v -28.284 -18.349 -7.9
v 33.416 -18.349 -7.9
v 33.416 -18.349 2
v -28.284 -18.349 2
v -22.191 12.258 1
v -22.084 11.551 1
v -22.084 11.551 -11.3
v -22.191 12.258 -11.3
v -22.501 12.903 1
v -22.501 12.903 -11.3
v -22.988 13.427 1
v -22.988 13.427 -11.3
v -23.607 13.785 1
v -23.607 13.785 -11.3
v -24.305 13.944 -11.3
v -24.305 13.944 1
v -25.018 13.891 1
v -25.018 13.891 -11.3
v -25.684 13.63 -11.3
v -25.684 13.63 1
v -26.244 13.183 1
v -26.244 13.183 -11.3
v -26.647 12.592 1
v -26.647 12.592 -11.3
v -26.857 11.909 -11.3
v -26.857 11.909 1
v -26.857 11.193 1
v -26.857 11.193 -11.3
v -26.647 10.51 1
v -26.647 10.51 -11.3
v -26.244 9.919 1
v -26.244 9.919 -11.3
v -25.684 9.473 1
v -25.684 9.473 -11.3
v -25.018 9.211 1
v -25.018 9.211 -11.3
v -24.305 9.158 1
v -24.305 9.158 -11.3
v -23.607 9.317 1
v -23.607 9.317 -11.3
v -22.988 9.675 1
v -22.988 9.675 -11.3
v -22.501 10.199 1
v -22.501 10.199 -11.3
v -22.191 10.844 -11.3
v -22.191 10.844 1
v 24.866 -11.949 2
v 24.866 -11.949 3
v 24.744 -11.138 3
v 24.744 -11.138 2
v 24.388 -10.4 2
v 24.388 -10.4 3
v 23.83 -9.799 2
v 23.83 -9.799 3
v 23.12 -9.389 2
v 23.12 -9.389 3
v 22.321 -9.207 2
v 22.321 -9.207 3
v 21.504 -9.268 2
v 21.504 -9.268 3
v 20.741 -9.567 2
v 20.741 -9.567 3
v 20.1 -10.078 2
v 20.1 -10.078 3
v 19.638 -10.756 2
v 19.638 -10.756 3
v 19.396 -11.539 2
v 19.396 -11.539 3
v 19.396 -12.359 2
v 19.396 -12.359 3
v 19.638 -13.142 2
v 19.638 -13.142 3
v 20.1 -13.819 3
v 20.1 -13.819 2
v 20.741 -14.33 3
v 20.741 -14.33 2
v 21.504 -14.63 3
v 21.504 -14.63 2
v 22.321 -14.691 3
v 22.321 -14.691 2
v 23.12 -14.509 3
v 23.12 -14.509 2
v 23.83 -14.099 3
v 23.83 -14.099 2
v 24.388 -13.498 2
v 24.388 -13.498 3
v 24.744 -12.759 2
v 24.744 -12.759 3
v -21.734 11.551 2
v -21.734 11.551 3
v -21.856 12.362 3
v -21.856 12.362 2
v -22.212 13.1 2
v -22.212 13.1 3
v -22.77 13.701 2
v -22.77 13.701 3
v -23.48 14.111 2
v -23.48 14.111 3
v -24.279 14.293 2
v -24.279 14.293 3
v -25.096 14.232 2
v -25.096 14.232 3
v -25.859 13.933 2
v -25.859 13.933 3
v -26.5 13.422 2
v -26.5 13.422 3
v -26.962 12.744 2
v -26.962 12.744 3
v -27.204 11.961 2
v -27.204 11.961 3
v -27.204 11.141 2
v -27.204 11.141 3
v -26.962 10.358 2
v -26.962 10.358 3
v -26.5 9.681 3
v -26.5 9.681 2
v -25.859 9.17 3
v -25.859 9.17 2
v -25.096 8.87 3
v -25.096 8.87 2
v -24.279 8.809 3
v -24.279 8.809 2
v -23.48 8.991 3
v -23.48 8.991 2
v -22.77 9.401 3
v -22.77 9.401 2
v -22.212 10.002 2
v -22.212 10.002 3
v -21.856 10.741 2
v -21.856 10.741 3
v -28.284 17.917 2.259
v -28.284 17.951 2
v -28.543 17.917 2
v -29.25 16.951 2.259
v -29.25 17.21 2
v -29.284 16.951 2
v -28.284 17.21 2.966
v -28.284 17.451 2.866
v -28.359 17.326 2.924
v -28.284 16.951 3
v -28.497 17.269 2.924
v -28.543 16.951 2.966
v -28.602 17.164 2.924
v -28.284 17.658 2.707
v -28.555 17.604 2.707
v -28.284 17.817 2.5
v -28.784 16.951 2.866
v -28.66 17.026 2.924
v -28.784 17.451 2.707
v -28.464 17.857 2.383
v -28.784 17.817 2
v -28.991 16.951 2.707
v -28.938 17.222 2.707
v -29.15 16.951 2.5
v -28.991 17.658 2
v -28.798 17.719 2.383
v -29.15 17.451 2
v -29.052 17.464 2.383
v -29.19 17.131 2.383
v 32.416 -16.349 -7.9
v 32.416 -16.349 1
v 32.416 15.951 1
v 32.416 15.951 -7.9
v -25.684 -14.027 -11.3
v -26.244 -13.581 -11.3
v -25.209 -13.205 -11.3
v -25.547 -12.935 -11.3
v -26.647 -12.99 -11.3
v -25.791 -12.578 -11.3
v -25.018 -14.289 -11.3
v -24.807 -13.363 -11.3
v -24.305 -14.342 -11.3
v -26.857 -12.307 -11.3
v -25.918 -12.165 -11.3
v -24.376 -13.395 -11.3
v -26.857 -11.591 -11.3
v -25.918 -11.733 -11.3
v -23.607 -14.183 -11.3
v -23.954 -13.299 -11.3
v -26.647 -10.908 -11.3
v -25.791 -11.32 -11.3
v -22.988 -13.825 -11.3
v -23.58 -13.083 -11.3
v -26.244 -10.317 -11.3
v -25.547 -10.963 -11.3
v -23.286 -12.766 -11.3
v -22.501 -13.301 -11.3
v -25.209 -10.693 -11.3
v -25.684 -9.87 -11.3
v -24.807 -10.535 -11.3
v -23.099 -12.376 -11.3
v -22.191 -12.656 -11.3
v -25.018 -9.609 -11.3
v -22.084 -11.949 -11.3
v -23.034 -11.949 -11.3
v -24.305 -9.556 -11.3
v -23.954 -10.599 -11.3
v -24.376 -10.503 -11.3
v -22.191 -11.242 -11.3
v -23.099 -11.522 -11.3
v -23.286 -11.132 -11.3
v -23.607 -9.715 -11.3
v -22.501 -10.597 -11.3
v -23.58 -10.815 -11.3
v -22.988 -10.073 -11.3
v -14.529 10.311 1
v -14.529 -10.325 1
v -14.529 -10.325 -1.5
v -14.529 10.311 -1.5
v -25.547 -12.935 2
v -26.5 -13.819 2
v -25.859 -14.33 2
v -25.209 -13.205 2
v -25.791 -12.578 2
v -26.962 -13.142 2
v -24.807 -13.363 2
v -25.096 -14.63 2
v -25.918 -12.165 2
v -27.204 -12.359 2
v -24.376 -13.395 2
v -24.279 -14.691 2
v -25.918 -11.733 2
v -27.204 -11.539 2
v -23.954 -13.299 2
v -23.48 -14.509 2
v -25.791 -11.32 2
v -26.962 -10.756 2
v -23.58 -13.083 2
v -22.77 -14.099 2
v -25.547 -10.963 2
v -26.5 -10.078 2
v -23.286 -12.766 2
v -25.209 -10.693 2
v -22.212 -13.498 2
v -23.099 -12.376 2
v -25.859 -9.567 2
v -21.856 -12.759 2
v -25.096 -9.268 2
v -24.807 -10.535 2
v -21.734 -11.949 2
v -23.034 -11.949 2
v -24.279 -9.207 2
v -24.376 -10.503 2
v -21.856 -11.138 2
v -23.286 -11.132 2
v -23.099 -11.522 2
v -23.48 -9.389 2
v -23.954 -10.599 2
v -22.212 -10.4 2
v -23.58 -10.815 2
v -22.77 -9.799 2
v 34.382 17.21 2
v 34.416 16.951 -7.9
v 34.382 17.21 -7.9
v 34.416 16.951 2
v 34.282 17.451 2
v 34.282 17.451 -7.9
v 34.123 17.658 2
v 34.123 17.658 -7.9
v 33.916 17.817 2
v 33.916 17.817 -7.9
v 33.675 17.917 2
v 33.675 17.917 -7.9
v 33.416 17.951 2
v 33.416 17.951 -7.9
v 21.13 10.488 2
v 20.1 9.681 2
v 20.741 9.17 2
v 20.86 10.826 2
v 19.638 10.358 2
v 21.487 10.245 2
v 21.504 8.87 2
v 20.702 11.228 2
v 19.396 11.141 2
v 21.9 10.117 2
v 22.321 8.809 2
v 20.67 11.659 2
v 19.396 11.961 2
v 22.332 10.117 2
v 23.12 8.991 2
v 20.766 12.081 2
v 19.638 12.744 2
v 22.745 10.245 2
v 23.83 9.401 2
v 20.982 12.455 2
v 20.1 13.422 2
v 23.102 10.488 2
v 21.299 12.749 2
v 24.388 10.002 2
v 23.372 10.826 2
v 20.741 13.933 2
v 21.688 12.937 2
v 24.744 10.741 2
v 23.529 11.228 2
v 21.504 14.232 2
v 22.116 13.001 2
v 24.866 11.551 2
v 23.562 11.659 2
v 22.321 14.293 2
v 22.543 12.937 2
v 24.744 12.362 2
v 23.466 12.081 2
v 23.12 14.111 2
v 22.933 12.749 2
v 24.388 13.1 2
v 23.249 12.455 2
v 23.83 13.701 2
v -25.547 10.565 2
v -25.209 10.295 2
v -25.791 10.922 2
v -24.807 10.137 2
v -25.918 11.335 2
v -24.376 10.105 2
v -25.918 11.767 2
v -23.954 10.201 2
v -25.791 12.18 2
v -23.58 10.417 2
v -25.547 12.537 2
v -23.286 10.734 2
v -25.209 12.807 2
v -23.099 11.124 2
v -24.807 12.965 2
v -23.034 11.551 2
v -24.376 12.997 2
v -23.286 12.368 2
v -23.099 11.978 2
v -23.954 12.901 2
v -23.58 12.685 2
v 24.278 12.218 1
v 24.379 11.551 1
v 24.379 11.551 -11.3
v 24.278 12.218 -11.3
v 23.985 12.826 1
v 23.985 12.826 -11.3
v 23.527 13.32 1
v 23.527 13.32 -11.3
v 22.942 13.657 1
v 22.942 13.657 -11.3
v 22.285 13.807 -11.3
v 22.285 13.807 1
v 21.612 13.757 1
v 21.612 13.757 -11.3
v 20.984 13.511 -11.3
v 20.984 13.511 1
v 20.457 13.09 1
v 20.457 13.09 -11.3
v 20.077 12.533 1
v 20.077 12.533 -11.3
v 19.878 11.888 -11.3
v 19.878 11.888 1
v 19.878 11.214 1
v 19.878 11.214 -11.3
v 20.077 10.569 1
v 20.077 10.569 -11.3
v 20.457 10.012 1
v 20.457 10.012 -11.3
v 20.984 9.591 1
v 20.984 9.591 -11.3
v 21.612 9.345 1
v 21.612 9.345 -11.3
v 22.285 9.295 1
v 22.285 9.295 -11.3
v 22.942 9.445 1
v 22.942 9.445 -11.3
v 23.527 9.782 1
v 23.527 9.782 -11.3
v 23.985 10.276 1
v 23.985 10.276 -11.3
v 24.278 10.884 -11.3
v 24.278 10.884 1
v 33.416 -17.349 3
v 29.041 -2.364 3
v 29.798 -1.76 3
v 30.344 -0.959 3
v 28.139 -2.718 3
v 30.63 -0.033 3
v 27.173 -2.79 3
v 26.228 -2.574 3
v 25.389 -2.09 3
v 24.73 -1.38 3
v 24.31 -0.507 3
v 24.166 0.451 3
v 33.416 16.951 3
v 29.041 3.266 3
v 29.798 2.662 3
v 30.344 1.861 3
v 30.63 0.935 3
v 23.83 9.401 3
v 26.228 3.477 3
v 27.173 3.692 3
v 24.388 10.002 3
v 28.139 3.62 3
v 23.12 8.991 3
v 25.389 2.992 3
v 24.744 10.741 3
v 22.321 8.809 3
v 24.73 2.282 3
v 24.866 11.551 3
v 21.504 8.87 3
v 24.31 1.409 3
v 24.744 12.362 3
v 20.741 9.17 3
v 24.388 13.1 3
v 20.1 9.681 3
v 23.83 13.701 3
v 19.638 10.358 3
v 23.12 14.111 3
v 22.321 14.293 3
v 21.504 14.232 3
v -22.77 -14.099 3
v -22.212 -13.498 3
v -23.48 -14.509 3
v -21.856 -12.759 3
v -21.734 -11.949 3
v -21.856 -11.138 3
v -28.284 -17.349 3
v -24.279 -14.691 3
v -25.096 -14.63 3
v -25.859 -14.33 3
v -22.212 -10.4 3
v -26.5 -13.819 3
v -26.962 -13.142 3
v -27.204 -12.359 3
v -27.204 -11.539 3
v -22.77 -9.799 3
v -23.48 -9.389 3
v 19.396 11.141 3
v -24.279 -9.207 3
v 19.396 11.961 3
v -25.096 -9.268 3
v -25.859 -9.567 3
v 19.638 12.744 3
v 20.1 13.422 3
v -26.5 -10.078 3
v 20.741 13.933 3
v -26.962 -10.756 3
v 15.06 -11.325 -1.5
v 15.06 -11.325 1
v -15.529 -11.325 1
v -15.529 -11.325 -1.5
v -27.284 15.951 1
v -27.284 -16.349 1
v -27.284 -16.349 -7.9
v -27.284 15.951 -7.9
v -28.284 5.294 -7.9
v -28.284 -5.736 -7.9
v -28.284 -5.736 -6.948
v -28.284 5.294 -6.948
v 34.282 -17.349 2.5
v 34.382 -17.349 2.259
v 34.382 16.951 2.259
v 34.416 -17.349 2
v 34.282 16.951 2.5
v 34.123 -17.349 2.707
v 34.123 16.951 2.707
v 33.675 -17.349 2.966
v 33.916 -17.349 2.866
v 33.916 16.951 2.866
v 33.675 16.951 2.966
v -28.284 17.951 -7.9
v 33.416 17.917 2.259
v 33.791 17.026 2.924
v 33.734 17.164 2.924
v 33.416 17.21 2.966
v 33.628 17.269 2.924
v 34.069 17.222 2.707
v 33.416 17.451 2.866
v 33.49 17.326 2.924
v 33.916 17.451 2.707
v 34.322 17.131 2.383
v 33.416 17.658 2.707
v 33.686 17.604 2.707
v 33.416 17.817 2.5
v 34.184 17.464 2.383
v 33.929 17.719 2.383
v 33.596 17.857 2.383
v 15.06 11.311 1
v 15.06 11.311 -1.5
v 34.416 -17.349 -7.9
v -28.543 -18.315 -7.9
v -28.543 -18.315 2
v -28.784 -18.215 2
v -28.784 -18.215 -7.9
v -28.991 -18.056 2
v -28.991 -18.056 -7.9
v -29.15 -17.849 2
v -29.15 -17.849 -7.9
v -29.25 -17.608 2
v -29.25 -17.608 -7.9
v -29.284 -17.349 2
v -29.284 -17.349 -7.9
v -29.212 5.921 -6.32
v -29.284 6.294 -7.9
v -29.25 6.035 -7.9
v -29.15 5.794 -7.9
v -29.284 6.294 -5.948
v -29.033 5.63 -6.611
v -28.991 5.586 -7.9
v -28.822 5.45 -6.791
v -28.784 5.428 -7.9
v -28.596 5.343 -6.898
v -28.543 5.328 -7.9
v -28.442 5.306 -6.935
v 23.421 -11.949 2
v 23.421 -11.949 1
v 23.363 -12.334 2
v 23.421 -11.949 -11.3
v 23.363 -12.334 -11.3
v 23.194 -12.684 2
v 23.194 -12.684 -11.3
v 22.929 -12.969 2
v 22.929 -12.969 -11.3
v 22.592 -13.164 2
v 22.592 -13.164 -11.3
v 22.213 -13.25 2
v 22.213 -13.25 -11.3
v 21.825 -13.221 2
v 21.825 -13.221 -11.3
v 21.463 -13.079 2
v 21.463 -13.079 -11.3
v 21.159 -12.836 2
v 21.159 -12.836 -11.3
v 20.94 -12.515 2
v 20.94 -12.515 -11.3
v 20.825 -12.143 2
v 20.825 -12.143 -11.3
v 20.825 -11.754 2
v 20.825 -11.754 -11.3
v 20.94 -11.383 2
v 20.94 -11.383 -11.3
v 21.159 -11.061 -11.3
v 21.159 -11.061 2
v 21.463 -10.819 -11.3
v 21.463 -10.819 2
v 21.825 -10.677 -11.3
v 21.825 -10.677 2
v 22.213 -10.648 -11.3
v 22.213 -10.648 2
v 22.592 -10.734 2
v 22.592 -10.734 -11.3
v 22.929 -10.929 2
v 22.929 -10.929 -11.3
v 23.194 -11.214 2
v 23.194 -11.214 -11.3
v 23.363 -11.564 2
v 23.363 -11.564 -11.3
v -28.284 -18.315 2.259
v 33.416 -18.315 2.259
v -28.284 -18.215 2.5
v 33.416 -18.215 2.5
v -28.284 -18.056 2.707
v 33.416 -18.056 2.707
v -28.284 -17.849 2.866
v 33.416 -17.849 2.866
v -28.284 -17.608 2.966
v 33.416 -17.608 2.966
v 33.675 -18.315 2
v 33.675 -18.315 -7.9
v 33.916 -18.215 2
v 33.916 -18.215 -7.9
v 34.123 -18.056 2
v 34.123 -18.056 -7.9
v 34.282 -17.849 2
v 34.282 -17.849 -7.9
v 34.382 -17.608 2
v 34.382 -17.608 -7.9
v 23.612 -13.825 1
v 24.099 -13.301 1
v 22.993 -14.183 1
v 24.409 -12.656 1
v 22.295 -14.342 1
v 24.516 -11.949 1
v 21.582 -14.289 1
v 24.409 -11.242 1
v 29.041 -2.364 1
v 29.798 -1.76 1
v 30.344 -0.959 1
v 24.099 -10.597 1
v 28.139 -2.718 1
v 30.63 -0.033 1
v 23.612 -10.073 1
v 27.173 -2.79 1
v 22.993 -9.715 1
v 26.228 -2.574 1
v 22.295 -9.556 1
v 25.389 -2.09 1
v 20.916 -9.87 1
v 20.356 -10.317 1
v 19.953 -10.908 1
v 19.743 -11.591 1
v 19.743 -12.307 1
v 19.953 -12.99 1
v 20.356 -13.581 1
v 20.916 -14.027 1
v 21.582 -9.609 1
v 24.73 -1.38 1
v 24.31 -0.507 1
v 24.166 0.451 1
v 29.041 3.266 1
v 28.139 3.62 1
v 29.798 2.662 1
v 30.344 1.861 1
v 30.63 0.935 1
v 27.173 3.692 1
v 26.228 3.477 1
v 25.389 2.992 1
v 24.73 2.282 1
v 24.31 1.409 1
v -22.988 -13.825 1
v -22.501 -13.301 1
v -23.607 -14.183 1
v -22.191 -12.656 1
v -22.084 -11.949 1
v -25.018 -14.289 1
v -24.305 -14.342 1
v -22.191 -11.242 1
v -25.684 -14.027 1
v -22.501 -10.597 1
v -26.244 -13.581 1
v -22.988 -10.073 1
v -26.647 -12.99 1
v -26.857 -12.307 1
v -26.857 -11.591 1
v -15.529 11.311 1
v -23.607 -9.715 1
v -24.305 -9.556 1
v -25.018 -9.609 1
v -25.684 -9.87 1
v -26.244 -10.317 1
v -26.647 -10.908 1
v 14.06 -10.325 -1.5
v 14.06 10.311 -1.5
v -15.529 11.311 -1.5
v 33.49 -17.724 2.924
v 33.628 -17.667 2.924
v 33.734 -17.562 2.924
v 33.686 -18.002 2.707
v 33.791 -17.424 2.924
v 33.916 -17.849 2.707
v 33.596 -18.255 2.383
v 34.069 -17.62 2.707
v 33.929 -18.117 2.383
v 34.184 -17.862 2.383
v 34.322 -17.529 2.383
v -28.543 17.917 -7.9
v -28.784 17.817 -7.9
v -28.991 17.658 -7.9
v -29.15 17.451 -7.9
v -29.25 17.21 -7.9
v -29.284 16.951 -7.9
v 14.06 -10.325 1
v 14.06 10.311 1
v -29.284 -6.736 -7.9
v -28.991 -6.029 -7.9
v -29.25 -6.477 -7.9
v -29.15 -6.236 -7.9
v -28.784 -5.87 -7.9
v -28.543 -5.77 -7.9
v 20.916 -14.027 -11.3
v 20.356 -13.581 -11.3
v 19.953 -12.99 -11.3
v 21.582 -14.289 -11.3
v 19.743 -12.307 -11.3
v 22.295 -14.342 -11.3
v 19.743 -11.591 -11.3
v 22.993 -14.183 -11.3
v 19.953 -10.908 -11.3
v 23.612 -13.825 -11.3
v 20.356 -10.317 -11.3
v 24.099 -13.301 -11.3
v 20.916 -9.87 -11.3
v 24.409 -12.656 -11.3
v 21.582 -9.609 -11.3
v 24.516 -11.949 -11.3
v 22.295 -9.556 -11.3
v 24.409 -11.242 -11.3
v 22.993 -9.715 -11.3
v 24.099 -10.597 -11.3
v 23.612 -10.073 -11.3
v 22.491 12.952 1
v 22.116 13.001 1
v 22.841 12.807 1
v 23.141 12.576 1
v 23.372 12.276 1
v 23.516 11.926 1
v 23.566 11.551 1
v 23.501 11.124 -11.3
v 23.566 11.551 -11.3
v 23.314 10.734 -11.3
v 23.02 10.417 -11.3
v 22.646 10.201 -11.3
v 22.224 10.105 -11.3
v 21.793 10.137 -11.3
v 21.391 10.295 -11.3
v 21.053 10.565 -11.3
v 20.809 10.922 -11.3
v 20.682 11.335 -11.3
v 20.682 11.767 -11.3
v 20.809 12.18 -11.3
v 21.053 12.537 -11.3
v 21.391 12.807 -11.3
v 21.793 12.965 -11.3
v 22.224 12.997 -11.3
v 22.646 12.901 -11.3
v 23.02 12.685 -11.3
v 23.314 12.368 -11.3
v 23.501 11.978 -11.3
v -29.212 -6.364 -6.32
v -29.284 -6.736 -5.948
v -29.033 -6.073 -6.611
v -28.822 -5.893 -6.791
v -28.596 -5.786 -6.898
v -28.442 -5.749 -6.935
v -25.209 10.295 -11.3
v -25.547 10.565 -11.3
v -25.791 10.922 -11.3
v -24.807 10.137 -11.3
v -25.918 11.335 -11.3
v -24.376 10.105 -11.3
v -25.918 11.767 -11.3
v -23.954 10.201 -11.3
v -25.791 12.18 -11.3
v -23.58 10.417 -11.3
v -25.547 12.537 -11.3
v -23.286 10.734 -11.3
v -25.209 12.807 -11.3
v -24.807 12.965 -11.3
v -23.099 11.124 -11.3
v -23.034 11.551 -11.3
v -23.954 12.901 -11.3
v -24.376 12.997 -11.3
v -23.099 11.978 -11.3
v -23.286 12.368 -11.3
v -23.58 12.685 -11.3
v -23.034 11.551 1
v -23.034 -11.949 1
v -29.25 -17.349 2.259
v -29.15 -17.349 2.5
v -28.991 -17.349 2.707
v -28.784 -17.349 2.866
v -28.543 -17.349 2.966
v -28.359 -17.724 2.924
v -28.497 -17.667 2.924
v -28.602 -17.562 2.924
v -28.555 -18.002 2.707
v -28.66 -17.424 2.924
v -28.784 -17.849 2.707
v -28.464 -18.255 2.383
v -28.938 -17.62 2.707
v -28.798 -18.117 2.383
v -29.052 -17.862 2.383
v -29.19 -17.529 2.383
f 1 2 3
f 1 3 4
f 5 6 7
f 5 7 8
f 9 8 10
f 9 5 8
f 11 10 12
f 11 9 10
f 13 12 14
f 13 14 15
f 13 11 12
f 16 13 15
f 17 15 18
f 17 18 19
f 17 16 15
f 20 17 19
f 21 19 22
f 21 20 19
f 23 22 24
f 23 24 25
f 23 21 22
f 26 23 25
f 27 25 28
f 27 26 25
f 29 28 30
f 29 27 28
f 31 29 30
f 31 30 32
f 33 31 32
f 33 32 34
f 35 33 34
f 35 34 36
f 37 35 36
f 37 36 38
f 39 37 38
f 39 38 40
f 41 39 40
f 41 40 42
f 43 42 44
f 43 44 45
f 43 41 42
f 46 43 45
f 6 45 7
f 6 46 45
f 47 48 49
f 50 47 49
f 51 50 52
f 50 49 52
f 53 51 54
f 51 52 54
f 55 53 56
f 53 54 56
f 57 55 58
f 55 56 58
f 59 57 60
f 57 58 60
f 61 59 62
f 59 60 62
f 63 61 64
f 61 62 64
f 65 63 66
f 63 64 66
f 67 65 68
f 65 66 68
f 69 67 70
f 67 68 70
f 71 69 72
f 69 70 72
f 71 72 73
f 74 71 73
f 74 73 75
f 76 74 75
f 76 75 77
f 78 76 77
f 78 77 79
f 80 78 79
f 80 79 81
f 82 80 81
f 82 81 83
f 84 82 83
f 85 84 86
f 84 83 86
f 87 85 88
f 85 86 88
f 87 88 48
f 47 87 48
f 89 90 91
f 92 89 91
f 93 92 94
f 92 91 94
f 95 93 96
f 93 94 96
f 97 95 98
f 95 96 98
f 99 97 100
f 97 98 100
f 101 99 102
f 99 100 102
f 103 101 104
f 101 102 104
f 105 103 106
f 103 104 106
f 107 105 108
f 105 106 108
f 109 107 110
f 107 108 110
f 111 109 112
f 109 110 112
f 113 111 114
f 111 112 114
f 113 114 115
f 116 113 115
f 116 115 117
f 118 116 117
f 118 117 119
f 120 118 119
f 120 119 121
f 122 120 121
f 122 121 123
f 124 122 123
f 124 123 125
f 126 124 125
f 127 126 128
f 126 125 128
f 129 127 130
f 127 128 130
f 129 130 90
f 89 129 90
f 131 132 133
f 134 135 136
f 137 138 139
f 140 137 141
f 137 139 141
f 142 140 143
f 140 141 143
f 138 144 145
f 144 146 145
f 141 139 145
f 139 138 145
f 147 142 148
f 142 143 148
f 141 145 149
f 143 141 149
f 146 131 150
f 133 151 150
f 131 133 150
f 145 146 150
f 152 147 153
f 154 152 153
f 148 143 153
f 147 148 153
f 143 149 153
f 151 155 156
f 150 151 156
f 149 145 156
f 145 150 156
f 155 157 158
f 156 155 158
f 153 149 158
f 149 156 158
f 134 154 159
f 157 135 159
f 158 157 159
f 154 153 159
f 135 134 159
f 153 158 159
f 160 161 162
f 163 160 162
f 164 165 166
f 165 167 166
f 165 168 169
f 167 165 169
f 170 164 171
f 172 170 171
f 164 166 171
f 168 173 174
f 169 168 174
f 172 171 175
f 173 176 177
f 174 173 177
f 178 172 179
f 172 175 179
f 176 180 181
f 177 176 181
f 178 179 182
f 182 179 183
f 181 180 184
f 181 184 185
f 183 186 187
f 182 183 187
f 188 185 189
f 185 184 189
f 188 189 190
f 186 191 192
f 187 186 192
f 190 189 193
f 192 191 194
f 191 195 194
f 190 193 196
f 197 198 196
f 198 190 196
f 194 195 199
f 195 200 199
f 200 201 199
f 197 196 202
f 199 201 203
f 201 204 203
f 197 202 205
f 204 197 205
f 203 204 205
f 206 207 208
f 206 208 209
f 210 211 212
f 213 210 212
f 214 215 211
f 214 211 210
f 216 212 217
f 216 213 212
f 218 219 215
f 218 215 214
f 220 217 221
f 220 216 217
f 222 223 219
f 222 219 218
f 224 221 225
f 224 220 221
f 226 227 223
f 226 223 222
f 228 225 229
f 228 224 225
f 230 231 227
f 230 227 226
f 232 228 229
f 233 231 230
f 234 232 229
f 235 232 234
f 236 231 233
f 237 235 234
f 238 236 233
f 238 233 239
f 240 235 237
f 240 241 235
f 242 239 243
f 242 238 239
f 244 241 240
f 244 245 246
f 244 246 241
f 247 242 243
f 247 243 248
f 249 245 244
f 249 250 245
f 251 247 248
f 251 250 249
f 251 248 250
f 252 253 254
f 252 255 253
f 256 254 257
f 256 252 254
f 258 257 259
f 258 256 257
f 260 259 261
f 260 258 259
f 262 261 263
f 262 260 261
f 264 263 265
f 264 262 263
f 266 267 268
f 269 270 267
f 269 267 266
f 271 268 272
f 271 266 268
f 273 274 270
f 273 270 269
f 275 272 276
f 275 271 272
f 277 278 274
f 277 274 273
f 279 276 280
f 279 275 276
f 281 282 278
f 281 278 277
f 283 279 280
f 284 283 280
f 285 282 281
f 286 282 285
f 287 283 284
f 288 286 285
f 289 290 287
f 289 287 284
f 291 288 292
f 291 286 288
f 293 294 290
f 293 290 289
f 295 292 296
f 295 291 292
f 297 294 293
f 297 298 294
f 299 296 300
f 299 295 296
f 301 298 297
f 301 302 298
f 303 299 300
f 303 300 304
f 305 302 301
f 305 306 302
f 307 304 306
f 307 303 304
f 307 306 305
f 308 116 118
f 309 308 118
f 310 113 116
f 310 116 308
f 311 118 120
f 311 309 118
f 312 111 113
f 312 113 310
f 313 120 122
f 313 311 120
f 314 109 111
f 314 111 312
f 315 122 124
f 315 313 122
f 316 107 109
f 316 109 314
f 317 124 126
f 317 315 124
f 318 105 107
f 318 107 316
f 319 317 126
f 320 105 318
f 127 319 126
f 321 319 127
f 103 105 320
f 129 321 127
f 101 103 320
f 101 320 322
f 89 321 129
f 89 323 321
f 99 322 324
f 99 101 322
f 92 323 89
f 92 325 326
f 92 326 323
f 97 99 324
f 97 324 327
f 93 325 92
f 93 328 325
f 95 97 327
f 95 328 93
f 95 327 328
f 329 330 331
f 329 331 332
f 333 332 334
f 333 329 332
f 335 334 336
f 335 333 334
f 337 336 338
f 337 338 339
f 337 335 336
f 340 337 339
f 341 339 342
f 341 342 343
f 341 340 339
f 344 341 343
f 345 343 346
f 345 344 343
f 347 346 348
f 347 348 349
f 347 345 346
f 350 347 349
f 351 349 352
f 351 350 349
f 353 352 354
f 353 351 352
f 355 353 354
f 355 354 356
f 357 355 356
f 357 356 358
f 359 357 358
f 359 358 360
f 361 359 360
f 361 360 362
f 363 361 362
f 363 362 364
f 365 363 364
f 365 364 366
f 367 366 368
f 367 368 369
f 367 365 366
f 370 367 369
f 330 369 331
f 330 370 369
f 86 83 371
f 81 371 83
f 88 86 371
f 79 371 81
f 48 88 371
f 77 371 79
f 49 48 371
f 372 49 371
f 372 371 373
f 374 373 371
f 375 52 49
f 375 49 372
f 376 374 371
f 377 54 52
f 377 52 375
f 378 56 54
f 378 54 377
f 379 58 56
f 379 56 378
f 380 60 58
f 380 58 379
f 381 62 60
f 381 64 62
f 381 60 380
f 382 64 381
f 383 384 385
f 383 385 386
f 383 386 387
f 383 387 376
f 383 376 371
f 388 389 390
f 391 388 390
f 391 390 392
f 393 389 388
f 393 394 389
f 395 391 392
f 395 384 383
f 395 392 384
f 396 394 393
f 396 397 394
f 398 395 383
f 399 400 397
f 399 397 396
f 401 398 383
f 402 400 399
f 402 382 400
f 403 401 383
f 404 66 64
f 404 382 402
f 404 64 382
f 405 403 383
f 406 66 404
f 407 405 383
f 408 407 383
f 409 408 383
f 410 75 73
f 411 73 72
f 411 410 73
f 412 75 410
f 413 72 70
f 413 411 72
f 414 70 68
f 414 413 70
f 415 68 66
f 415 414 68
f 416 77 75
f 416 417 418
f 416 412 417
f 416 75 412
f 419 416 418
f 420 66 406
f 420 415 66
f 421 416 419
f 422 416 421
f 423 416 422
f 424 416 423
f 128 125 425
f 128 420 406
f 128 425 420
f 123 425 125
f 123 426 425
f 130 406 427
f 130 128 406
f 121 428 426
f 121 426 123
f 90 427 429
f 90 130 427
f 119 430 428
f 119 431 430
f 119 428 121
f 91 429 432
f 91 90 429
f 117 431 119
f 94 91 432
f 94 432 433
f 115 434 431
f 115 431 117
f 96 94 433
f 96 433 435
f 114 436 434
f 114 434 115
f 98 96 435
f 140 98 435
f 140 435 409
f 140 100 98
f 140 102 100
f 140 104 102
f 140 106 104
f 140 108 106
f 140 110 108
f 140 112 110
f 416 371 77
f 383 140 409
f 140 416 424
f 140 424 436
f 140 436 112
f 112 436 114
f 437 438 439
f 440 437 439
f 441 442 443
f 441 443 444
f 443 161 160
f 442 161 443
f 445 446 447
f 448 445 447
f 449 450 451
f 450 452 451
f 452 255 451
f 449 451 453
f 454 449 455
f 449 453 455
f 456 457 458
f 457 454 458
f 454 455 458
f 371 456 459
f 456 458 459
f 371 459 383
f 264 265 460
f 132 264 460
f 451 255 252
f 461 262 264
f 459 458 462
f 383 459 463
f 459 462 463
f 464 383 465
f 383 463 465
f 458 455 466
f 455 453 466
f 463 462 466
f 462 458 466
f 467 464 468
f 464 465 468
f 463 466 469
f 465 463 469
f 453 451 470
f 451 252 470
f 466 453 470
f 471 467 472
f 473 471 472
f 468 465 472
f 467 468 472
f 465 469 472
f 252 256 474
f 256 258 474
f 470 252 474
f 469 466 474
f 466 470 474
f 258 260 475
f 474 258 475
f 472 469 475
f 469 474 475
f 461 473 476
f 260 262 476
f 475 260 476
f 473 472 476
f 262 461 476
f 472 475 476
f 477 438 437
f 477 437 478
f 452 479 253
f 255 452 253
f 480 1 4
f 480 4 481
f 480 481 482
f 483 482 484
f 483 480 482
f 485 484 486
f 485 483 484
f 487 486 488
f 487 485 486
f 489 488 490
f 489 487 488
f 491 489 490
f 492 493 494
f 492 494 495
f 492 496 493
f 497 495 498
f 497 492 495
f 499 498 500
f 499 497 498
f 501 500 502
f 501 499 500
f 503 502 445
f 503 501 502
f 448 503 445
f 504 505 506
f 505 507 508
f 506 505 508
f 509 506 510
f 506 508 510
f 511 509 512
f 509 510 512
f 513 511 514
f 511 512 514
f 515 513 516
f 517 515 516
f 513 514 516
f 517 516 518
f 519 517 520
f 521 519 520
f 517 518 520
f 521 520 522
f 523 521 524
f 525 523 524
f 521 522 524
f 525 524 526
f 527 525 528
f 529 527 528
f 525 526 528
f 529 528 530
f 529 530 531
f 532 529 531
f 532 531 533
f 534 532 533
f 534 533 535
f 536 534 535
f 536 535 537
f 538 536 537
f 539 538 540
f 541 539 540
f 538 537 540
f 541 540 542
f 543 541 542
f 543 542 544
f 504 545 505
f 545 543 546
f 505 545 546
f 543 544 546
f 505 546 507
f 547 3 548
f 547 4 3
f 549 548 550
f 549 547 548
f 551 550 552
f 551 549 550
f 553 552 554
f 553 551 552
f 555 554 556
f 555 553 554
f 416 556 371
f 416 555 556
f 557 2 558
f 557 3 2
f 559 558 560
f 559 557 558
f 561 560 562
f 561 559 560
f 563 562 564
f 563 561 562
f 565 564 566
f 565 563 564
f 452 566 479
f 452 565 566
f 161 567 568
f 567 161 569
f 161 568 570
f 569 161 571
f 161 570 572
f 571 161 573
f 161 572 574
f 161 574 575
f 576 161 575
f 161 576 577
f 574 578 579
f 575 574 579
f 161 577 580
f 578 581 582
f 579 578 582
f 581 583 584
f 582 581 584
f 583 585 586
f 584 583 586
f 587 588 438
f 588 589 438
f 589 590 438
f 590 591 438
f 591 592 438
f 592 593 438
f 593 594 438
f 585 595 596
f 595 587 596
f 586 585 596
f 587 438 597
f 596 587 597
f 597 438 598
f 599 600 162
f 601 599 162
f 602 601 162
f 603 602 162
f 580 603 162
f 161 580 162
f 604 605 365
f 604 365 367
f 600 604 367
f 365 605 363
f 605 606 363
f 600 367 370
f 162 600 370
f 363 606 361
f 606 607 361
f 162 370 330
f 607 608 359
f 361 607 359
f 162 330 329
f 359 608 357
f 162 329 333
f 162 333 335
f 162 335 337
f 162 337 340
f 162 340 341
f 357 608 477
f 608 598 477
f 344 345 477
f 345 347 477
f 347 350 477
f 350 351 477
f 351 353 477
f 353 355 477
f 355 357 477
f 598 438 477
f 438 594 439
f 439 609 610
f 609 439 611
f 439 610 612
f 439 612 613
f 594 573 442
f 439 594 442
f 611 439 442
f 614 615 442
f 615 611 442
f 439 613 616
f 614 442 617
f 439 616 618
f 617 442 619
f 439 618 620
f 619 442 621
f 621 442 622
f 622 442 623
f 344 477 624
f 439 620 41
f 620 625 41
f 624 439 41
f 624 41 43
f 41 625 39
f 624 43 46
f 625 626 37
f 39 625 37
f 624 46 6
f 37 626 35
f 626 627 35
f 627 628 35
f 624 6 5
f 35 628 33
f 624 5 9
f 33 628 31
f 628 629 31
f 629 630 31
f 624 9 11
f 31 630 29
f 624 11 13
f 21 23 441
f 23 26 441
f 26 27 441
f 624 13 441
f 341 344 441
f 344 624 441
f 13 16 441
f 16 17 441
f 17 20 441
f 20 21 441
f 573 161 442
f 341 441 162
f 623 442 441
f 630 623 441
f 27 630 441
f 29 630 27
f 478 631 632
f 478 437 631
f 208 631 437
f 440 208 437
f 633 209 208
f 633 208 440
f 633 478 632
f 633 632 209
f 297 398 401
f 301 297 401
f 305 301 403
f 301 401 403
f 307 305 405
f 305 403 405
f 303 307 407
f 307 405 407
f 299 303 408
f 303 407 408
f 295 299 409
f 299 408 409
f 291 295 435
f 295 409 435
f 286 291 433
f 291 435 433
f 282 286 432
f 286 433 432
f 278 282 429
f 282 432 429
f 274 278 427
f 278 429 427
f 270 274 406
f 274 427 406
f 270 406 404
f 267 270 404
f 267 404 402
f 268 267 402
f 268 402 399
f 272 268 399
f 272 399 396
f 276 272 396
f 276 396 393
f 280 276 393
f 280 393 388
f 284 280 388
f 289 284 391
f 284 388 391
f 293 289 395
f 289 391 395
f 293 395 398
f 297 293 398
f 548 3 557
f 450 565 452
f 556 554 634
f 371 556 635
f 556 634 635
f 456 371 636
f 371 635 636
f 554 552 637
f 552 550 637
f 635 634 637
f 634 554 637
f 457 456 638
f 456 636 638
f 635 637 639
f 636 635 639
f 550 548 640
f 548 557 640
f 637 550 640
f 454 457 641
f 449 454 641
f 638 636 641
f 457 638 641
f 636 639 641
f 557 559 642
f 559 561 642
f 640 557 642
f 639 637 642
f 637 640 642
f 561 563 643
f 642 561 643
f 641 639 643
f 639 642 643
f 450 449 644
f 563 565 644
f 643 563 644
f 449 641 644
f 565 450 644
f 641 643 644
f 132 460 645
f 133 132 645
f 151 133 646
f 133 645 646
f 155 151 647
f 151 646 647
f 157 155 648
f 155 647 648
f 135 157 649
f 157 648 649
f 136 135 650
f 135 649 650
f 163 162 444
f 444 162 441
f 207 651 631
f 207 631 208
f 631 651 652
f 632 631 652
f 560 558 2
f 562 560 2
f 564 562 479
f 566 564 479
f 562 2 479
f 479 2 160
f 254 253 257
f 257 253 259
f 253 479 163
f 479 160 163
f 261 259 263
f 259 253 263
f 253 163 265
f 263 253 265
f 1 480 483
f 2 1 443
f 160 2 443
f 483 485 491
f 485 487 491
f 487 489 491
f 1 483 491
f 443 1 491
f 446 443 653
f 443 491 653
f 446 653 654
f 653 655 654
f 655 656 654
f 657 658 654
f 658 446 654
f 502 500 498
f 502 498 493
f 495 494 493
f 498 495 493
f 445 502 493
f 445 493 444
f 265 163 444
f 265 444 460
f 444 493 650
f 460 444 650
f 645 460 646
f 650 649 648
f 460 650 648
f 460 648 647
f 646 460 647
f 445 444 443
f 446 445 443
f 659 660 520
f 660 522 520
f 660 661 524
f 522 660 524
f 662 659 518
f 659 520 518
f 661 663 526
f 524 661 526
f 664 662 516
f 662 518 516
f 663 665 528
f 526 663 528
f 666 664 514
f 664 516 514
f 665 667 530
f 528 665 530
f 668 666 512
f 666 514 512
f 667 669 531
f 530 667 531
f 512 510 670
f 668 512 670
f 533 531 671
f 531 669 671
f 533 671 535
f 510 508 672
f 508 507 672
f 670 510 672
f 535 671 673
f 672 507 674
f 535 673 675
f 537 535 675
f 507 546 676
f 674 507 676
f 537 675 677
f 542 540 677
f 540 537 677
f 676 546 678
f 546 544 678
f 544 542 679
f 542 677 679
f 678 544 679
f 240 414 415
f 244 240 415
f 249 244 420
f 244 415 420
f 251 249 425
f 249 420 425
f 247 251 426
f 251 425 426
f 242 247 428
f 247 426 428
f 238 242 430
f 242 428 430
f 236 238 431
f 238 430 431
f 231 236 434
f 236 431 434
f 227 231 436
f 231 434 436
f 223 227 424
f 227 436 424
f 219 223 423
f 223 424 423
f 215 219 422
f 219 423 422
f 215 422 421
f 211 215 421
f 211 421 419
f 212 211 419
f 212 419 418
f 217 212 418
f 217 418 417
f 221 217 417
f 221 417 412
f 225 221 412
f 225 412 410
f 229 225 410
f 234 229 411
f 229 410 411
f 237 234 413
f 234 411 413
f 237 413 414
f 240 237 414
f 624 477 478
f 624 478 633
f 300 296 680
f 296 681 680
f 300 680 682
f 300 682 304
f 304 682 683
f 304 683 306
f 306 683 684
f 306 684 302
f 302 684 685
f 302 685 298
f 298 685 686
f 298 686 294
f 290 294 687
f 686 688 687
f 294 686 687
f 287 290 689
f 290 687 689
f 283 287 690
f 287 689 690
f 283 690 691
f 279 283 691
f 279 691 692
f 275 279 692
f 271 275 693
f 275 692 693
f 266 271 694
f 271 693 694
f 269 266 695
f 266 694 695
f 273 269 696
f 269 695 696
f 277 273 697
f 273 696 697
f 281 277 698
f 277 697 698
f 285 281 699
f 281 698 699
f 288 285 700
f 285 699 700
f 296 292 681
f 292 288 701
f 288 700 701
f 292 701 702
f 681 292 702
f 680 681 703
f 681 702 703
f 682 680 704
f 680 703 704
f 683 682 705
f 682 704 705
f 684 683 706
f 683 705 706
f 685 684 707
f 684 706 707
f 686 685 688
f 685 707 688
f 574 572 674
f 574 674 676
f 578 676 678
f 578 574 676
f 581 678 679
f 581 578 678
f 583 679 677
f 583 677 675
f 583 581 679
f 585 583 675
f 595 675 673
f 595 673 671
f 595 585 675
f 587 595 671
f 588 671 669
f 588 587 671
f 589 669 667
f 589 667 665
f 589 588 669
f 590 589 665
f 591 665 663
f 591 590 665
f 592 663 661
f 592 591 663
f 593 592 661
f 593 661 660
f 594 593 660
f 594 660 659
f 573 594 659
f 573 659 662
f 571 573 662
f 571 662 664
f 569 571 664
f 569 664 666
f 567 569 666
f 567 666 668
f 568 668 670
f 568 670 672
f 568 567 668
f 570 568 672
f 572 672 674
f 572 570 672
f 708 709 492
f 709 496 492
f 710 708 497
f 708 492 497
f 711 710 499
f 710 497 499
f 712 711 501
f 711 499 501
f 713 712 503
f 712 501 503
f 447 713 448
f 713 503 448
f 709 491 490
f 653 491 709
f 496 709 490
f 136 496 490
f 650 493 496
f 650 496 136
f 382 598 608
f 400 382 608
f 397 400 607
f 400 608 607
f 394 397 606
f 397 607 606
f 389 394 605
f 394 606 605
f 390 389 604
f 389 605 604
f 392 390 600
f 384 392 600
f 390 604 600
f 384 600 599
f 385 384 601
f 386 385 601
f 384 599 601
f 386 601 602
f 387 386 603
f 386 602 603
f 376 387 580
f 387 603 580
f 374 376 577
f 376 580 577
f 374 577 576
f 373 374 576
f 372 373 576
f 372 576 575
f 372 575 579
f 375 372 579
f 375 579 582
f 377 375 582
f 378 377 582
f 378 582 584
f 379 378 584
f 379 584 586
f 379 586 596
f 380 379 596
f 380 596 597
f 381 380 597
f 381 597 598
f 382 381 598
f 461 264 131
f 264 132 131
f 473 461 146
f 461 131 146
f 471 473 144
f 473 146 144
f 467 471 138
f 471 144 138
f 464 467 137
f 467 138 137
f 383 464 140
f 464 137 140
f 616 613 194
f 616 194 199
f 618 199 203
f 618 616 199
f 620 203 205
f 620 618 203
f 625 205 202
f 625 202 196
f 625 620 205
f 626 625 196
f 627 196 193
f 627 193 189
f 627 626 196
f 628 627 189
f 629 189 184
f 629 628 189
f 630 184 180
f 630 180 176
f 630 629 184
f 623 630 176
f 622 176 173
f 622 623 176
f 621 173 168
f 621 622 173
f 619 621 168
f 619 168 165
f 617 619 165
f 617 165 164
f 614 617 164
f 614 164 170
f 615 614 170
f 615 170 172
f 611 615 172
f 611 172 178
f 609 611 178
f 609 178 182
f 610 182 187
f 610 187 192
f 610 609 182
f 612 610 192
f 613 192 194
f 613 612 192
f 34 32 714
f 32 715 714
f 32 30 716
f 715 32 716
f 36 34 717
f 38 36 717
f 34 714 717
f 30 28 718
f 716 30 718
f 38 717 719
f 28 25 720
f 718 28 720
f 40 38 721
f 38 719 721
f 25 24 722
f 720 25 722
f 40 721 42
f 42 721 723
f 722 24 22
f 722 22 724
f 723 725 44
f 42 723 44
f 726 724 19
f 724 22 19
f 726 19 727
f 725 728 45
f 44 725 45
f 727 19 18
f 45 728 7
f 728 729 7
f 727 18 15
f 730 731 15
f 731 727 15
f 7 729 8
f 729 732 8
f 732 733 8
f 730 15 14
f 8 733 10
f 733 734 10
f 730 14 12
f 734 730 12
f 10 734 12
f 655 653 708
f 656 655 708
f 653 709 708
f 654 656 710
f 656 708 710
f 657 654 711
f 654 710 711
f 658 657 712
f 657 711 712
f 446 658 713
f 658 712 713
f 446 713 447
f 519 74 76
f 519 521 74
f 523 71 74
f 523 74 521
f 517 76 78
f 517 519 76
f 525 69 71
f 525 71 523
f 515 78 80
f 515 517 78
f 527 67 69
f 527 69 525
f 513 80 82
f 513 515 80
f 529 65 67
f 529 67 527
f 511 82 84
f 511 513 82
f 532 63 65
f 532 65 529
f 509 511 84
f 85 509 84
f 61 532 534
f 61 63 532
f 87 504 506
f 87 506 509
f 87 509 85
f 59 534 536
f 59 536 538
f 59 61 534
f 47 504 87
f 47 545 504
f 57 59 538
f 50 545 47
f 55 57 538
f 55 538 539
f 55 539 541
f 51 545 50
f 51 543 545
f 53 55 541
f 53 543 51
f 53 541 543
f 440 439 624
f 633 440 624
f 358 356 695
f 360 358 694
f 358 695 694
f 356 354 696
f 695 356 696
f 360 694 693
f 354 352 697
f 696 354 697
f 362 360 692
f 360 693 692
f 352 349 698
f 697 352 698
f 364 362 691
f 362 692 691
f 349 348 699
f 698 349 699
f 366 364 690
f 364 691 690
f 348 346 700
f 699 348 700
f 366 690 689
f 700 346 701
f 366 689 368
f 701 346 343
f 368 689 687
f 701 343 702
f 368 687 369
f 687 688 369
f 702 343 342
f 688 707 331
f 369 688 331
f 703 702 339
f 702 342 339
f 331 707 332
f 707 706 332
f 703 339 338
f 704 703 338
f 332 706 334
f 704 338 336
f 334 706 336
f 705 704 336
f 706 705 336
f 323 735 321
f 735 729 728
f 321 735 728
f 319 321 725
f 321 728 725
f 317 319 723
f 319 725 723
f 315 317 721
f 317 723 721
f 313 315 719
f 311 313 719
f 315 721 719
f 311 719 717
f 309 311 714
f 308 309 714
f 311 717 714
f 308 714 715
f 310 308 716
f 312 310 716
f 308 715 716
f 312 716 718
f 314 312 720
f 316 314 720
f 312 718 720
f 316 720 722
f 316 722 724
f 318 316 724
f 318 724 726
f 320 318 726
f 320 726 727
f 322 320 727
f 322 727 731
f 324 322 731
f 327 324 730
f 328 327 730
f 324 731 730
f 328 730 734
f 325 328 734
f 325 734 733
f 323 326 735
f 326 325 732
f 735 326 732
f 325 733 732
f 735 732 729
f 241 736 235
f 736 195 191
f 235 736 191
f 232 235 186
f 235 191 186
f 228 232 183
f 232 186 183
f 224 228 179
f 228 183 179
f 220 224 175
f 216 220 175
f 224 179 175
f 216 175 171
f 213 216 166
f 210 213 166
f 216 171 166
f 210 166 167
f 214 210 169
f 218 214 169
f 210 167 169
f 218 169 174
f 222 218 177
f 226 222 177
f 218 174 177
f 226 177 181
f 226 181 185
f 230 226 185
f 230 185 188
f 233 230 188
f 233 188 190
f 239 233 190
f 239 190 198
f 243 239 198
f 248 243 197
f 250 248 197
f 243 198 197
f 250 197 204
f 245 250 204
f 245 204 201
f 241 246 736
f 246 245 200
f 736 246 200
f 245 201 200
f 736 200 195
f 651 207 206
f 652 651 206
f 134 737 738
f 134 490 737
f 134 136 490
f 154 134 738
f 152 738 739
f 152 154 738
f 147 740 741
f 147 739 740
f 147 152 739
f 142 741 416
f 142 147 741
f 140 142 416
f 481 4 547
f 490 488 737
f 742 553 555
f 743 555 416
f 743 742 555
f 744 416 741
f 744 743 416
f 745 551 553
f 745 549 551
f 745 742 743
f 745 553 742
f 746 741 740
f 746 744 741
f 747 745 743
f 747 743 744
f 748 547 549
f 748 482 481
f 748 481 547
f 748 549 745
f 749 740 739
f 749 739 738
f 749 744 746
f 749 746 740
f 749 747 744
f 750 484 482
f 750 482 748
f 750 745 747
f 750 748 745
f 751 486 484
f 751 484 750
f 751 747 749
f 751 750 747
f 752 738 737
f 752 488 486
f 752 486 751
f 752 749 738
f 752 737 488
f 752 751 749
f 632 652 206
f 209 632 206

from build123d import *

# Parameters (mm, degrees)
CROQUIS2_R                = 2.4
CROQUIS2_R_2              = 1.45
SALIENTE_EXTRUIR2_DEPTH   = 12.3
SALIENTE_EXTRUIR2_2_DEPTH = 12.3
CROQUIS2_R_3              = 2.2627417
SALIENTE_EXTRUIR2_3_DEPTH = 12.3
CROQUIS2_R_4              = 1.304870774
SALIENTE_EXTRUIR2_4_DEPTH = 12.3
CROQUIS4_W                = 36.3
CROQUIS4_H                = 63.7
CROQUIS4_W_2              = 32.3
CROQUIS4_H_2              = 59.7
SALIENTE_EXTRUIR4_DEPTH   = 8.9
CROQUIS5_W                = 36.3
CROQUIS5_H                = 63.7
SALIENTE_EXTRUIR5_DEPTH   = 2
REDONDEO1_R               = 1
CROQUIS6_W                = 0.952491513
CROQUIS6_H                = 11.029714725
CORTAR_EXTRUIR1_DEPTH     = 1
REDONDEO2_R               = 1
CROQUIS7_R                = 1.45
CROQUIS7_R_2              = 1.304870774
CORTAR_EXTRUIR2_DEPTH     = 42.540563821
CROQUIS8_R                = 2.75
CORTAR_EXTRUIR3_DEPTH     = 1
CROQUIS9_R                = 3.250192478
CORTAR_EXTRUIR4_DEPTH     = 41.895212954
CROQUIS10_W               = 30.589236147
CROQUIS10_H               = 22.63620754
CROQUIS10_W_2             = 28.589236147
CROQUIS10_H_2             = 20.63620754
SALIENTE_EXTRUIR6_DEPTH   = 2.5


with BuildPart() as part:
    # Croquis2 → Saliente-Extruir2 (new body)
    with BuildSketch(Plane(origin=(-1.363345475, 4.236097797, 1), x_dir=(0, 1, 0), z_dir=(0, 0, 1))):
        with Locations(Location((-16.185020115, 23.120880637, 0), (0, 0, 270))):
            Circle(CROQUIS2_R)
        with Locations(Location((-16.185020115, 23.120880637, 0), (0, 0, 270))):
            Circle(CROQUIS2_R_2, mode=Mode.SUBTRACT)
    extrude(amount=-SALIENTE_EXTRUIR2_DEPTH)



with BuildPart() as body_2:
    # Croquis2 → Saliente-Extruir2 2 (new body)
    with BuildSketch(Plane(origin=(-1.363345475, 4.236097797, 1), x_dir=(0, 1, 0), z_dir=(0, 0, 1))):
        with Locations(Location((7.314979885, 23.120880637, 0), (0, 0, 270))):
            Circle(CROQUIS2_R)
        with Locations(Location((7.314979885, 23.120880637, 0), (0, 0, 270))):
            Circle(CROQUIS2_R_2, mode=Mode.SUBTRACT)
    extrude(amount=-SALIENTE_EXTRUIR2_2_DEPTH)


with BuildPart() as body_3:
    # Croquis2 → Saliente-Extruir2 3 (new body)
    with BuildSketch(Plane(origin=(-1.363345475, 4.236097797, 1), x_dir=(0, 1, 0), z_dir=(0, 0, 1))):
        with Locations(Location((7.314979885, -23.479119363, 0), (0, 0, 270))):
            Circle(CROQUIS2_R_3)
        with Locations(Location((7.314979885, -23.479119363, 0), (0, 0, 270))):
            Circle(CROQUIS2_R_2, mode=Mode.SUBTRACT)
    extrude(amount=-SALIENTE_EXTRUIR2_3_DEPTH)


with BuildPart() as body_4:
    # Croquis2 → Saliente-Extruir2 4 (new body)
    with BuildSketch(Plane(origin=(-1.363345475, 4.236097797, 1), x_dir=(0, 1, 0), z_dir=(0, 0, 1))):
        with Locations(Location((-16.185020115, -23.479119363, 0), (0, 0, 270))):
            Circle(CROQUIS2_R)
        with Locations(Location((-16.185020115, -23.479119363, 0), (0, 0, 270))):
            Circle(CROQUIS2_R_4, mode=Mode.SUBTRACT)
    extrude(amount=-SALIENTE_EXTRUIR2_4_DEPTH)


with BuildPart() as body_5:
    # Croquis4 → Saliente-Extruir4 (new body)
    with BuildSketch(Plane(origin=(-1.363345475, 4.236097797, 1), x_dir=(0, 1, 0), z_dir=(0, 0, 1))):
        with Locations((-4.435020115, -3.929119363)):
            Rectangle(CROQUIS4_W, CROQUIS4_H)
        with Locations((-4.435020115, -3.929119363)):
            Rectangle(CROQUIS4_W_2, CROQUIS4_H_2, mode=Mode.SUBTRACT)
    extrude(amount=-SALIENTE_EXTRUIR4_DEPTH)


with BuildPart() as part_1:
    add(part.part)

    add(body_2.part)  # Saliente-Extruir5 merges body 2

    add(body_3.part)  # Saliente-Extruir5 merges body 3

    add(body_4.part)  # Saliente-Extruir5 merges body 4

    add(body_5.part)  # Saliente-Extruir5 merges body 5
    # Croquis5 → Saliente-Extruir5 (add)
    with BuildSketch(Plane(origin=(-1.363345475, 4.236097797, 1), x_dir=(0, 1, 0), z_dir=(0, 0, 1))):
        with Locations((-4.435020115, -3.929119363)):
            Rectangle(CROQUIS5_W, CROQUIS5_H)
    extrude(amount=SALIENTE_EXTRUIR5_DEPTH)

    # Redondeo1
    redondeo1_edges = [part_1.edges().sort_by_distance(p)[0] for p in [
        (-29.284226112, -18.348922317, -2.45),
        (34.415773888, -18.348922317, -2.45),
        (34.415773888, 17.951077683, -2.45),
        (-29.284226112, 17.951077683, -2.45),
        (2.565773888, -18.348922317, 3),
        (34.415773888, -0.198922317, 3),
        (2.565773888, 17.951077683, 3),
        (-29.284226112, -0.198922317, 3),
    ]]
    fillet(redondeo1_edges, radius=REDONDEO1_R)

    # Croquis6 → Cortar-Extruir1 (cut)
    with BuildSketch(Plane.ZY.offset(29.284226112)):
        with Locations((-7.423754244, -0.221239115)):
            Rectangle(CROQUIS6_W, CROQUIS6_H)
    extrude(amount=-CORTAR_EXTRUIR1_DEPTH, mode=Mode.SUBTRACT)

    # Redondeo2
    redondeo2_edges = [part_1.edges().sort_by_distance(p)[0] for p in [
        (-29.284226112, -5.736096478, -7.423754243),
        (-29.284226112, 5.293618247, -7.423754243),
        (-29.284226112, -0.221239116, -6.947508487),
    ]]
    fillet(redondeo2_edges, radius=REDONDEO2_R - 0.0001)  # a hair under: the kernel refuses the full size

    # Croquis7 → Cortar-Extruir2 (cut, through all)
    with BuildSketch(Plane(origin=(0, 0, -11.3), x_dir=(-1, 0, 0), z_dir=(0, 0, -1))):
        with Locations(Location((24.484226112, 11.551077683, 0), (0, 0, 180))):
            Circle(CROQUIS7_R)
        with Locations(Location((24.484226112, -11.948922317, 0), (0, 0, 180))):
            Circle(CROQUIS7_R)
        with Locations(Location((-22.115773888, -11.948922317, 0), (0, 0, 180))):
            Circle(CROQUIS7_R_2)
        with Locations(Location((-22.115773888, 11.551077683, 0), (0, 0, 90))):
            Circle(CROQUIS7_R)
    extrude(amount=-CORTAR_EXTRUIR2_DEPTH, mode=Mode.SUBTRACT)

    # Croquis8 → Cortar-Extruir3 (cut)
    with BuildSketch(Plane.XY.offset(3)):
        with Locations((-24.484226112, -11.948922317)):
            Circle(CROQUIS8_R)
        with Locations((-24.484226112, 11.551077683)):
            Circle(CROQUIS8_R)
        with Locations((22.115773888, -11.948922317)):
            Circle(CROQUIS8_R)
        with Locations((22.115773888, 11.551077683)):
            Circle(CROQUIS8_R)
    extrude(amount=-CORTAR_EXTRUIR3_DEPTH, mode=Mode.SUBTRACT)

    # Croquis9 → Cortar-Extruir4 (cut, through all)
    with BuildSketch(Plane(origin=(0, 0, 1), x_dir=(-1, 0, 0), z_dir=(0, 0, -1))):
        with Locations((-27.415773888, 0.451077683)):
            Circle(CROQUIS9_R)
    extrude(amount=-CORTAR_EXTRUIR4_DEPTH, mode=Mode.SUBTRACT)

    # Croquis10 → Saliente-Extruir6 (add)
    with BuildSketch(Plane(origin=(0, 0, 1), x_dir=(-1, 0, 0), z_dir=(0, 0, -1))):
        with Locations((0.23483353, -0.007358301)):
            Rectangle(CROQUIS10_W, CROQUIS10_H)
        with Locations((0.234833529, -0.007358301)):
            Rectangle(CROQUIS10_W_2, CROQUIS10_H_2, mode=Mode.SUBTRACT)
    extrude(amount=SALIENTE_EXTRUIR6_DEPTH)


solid = part_1.part
